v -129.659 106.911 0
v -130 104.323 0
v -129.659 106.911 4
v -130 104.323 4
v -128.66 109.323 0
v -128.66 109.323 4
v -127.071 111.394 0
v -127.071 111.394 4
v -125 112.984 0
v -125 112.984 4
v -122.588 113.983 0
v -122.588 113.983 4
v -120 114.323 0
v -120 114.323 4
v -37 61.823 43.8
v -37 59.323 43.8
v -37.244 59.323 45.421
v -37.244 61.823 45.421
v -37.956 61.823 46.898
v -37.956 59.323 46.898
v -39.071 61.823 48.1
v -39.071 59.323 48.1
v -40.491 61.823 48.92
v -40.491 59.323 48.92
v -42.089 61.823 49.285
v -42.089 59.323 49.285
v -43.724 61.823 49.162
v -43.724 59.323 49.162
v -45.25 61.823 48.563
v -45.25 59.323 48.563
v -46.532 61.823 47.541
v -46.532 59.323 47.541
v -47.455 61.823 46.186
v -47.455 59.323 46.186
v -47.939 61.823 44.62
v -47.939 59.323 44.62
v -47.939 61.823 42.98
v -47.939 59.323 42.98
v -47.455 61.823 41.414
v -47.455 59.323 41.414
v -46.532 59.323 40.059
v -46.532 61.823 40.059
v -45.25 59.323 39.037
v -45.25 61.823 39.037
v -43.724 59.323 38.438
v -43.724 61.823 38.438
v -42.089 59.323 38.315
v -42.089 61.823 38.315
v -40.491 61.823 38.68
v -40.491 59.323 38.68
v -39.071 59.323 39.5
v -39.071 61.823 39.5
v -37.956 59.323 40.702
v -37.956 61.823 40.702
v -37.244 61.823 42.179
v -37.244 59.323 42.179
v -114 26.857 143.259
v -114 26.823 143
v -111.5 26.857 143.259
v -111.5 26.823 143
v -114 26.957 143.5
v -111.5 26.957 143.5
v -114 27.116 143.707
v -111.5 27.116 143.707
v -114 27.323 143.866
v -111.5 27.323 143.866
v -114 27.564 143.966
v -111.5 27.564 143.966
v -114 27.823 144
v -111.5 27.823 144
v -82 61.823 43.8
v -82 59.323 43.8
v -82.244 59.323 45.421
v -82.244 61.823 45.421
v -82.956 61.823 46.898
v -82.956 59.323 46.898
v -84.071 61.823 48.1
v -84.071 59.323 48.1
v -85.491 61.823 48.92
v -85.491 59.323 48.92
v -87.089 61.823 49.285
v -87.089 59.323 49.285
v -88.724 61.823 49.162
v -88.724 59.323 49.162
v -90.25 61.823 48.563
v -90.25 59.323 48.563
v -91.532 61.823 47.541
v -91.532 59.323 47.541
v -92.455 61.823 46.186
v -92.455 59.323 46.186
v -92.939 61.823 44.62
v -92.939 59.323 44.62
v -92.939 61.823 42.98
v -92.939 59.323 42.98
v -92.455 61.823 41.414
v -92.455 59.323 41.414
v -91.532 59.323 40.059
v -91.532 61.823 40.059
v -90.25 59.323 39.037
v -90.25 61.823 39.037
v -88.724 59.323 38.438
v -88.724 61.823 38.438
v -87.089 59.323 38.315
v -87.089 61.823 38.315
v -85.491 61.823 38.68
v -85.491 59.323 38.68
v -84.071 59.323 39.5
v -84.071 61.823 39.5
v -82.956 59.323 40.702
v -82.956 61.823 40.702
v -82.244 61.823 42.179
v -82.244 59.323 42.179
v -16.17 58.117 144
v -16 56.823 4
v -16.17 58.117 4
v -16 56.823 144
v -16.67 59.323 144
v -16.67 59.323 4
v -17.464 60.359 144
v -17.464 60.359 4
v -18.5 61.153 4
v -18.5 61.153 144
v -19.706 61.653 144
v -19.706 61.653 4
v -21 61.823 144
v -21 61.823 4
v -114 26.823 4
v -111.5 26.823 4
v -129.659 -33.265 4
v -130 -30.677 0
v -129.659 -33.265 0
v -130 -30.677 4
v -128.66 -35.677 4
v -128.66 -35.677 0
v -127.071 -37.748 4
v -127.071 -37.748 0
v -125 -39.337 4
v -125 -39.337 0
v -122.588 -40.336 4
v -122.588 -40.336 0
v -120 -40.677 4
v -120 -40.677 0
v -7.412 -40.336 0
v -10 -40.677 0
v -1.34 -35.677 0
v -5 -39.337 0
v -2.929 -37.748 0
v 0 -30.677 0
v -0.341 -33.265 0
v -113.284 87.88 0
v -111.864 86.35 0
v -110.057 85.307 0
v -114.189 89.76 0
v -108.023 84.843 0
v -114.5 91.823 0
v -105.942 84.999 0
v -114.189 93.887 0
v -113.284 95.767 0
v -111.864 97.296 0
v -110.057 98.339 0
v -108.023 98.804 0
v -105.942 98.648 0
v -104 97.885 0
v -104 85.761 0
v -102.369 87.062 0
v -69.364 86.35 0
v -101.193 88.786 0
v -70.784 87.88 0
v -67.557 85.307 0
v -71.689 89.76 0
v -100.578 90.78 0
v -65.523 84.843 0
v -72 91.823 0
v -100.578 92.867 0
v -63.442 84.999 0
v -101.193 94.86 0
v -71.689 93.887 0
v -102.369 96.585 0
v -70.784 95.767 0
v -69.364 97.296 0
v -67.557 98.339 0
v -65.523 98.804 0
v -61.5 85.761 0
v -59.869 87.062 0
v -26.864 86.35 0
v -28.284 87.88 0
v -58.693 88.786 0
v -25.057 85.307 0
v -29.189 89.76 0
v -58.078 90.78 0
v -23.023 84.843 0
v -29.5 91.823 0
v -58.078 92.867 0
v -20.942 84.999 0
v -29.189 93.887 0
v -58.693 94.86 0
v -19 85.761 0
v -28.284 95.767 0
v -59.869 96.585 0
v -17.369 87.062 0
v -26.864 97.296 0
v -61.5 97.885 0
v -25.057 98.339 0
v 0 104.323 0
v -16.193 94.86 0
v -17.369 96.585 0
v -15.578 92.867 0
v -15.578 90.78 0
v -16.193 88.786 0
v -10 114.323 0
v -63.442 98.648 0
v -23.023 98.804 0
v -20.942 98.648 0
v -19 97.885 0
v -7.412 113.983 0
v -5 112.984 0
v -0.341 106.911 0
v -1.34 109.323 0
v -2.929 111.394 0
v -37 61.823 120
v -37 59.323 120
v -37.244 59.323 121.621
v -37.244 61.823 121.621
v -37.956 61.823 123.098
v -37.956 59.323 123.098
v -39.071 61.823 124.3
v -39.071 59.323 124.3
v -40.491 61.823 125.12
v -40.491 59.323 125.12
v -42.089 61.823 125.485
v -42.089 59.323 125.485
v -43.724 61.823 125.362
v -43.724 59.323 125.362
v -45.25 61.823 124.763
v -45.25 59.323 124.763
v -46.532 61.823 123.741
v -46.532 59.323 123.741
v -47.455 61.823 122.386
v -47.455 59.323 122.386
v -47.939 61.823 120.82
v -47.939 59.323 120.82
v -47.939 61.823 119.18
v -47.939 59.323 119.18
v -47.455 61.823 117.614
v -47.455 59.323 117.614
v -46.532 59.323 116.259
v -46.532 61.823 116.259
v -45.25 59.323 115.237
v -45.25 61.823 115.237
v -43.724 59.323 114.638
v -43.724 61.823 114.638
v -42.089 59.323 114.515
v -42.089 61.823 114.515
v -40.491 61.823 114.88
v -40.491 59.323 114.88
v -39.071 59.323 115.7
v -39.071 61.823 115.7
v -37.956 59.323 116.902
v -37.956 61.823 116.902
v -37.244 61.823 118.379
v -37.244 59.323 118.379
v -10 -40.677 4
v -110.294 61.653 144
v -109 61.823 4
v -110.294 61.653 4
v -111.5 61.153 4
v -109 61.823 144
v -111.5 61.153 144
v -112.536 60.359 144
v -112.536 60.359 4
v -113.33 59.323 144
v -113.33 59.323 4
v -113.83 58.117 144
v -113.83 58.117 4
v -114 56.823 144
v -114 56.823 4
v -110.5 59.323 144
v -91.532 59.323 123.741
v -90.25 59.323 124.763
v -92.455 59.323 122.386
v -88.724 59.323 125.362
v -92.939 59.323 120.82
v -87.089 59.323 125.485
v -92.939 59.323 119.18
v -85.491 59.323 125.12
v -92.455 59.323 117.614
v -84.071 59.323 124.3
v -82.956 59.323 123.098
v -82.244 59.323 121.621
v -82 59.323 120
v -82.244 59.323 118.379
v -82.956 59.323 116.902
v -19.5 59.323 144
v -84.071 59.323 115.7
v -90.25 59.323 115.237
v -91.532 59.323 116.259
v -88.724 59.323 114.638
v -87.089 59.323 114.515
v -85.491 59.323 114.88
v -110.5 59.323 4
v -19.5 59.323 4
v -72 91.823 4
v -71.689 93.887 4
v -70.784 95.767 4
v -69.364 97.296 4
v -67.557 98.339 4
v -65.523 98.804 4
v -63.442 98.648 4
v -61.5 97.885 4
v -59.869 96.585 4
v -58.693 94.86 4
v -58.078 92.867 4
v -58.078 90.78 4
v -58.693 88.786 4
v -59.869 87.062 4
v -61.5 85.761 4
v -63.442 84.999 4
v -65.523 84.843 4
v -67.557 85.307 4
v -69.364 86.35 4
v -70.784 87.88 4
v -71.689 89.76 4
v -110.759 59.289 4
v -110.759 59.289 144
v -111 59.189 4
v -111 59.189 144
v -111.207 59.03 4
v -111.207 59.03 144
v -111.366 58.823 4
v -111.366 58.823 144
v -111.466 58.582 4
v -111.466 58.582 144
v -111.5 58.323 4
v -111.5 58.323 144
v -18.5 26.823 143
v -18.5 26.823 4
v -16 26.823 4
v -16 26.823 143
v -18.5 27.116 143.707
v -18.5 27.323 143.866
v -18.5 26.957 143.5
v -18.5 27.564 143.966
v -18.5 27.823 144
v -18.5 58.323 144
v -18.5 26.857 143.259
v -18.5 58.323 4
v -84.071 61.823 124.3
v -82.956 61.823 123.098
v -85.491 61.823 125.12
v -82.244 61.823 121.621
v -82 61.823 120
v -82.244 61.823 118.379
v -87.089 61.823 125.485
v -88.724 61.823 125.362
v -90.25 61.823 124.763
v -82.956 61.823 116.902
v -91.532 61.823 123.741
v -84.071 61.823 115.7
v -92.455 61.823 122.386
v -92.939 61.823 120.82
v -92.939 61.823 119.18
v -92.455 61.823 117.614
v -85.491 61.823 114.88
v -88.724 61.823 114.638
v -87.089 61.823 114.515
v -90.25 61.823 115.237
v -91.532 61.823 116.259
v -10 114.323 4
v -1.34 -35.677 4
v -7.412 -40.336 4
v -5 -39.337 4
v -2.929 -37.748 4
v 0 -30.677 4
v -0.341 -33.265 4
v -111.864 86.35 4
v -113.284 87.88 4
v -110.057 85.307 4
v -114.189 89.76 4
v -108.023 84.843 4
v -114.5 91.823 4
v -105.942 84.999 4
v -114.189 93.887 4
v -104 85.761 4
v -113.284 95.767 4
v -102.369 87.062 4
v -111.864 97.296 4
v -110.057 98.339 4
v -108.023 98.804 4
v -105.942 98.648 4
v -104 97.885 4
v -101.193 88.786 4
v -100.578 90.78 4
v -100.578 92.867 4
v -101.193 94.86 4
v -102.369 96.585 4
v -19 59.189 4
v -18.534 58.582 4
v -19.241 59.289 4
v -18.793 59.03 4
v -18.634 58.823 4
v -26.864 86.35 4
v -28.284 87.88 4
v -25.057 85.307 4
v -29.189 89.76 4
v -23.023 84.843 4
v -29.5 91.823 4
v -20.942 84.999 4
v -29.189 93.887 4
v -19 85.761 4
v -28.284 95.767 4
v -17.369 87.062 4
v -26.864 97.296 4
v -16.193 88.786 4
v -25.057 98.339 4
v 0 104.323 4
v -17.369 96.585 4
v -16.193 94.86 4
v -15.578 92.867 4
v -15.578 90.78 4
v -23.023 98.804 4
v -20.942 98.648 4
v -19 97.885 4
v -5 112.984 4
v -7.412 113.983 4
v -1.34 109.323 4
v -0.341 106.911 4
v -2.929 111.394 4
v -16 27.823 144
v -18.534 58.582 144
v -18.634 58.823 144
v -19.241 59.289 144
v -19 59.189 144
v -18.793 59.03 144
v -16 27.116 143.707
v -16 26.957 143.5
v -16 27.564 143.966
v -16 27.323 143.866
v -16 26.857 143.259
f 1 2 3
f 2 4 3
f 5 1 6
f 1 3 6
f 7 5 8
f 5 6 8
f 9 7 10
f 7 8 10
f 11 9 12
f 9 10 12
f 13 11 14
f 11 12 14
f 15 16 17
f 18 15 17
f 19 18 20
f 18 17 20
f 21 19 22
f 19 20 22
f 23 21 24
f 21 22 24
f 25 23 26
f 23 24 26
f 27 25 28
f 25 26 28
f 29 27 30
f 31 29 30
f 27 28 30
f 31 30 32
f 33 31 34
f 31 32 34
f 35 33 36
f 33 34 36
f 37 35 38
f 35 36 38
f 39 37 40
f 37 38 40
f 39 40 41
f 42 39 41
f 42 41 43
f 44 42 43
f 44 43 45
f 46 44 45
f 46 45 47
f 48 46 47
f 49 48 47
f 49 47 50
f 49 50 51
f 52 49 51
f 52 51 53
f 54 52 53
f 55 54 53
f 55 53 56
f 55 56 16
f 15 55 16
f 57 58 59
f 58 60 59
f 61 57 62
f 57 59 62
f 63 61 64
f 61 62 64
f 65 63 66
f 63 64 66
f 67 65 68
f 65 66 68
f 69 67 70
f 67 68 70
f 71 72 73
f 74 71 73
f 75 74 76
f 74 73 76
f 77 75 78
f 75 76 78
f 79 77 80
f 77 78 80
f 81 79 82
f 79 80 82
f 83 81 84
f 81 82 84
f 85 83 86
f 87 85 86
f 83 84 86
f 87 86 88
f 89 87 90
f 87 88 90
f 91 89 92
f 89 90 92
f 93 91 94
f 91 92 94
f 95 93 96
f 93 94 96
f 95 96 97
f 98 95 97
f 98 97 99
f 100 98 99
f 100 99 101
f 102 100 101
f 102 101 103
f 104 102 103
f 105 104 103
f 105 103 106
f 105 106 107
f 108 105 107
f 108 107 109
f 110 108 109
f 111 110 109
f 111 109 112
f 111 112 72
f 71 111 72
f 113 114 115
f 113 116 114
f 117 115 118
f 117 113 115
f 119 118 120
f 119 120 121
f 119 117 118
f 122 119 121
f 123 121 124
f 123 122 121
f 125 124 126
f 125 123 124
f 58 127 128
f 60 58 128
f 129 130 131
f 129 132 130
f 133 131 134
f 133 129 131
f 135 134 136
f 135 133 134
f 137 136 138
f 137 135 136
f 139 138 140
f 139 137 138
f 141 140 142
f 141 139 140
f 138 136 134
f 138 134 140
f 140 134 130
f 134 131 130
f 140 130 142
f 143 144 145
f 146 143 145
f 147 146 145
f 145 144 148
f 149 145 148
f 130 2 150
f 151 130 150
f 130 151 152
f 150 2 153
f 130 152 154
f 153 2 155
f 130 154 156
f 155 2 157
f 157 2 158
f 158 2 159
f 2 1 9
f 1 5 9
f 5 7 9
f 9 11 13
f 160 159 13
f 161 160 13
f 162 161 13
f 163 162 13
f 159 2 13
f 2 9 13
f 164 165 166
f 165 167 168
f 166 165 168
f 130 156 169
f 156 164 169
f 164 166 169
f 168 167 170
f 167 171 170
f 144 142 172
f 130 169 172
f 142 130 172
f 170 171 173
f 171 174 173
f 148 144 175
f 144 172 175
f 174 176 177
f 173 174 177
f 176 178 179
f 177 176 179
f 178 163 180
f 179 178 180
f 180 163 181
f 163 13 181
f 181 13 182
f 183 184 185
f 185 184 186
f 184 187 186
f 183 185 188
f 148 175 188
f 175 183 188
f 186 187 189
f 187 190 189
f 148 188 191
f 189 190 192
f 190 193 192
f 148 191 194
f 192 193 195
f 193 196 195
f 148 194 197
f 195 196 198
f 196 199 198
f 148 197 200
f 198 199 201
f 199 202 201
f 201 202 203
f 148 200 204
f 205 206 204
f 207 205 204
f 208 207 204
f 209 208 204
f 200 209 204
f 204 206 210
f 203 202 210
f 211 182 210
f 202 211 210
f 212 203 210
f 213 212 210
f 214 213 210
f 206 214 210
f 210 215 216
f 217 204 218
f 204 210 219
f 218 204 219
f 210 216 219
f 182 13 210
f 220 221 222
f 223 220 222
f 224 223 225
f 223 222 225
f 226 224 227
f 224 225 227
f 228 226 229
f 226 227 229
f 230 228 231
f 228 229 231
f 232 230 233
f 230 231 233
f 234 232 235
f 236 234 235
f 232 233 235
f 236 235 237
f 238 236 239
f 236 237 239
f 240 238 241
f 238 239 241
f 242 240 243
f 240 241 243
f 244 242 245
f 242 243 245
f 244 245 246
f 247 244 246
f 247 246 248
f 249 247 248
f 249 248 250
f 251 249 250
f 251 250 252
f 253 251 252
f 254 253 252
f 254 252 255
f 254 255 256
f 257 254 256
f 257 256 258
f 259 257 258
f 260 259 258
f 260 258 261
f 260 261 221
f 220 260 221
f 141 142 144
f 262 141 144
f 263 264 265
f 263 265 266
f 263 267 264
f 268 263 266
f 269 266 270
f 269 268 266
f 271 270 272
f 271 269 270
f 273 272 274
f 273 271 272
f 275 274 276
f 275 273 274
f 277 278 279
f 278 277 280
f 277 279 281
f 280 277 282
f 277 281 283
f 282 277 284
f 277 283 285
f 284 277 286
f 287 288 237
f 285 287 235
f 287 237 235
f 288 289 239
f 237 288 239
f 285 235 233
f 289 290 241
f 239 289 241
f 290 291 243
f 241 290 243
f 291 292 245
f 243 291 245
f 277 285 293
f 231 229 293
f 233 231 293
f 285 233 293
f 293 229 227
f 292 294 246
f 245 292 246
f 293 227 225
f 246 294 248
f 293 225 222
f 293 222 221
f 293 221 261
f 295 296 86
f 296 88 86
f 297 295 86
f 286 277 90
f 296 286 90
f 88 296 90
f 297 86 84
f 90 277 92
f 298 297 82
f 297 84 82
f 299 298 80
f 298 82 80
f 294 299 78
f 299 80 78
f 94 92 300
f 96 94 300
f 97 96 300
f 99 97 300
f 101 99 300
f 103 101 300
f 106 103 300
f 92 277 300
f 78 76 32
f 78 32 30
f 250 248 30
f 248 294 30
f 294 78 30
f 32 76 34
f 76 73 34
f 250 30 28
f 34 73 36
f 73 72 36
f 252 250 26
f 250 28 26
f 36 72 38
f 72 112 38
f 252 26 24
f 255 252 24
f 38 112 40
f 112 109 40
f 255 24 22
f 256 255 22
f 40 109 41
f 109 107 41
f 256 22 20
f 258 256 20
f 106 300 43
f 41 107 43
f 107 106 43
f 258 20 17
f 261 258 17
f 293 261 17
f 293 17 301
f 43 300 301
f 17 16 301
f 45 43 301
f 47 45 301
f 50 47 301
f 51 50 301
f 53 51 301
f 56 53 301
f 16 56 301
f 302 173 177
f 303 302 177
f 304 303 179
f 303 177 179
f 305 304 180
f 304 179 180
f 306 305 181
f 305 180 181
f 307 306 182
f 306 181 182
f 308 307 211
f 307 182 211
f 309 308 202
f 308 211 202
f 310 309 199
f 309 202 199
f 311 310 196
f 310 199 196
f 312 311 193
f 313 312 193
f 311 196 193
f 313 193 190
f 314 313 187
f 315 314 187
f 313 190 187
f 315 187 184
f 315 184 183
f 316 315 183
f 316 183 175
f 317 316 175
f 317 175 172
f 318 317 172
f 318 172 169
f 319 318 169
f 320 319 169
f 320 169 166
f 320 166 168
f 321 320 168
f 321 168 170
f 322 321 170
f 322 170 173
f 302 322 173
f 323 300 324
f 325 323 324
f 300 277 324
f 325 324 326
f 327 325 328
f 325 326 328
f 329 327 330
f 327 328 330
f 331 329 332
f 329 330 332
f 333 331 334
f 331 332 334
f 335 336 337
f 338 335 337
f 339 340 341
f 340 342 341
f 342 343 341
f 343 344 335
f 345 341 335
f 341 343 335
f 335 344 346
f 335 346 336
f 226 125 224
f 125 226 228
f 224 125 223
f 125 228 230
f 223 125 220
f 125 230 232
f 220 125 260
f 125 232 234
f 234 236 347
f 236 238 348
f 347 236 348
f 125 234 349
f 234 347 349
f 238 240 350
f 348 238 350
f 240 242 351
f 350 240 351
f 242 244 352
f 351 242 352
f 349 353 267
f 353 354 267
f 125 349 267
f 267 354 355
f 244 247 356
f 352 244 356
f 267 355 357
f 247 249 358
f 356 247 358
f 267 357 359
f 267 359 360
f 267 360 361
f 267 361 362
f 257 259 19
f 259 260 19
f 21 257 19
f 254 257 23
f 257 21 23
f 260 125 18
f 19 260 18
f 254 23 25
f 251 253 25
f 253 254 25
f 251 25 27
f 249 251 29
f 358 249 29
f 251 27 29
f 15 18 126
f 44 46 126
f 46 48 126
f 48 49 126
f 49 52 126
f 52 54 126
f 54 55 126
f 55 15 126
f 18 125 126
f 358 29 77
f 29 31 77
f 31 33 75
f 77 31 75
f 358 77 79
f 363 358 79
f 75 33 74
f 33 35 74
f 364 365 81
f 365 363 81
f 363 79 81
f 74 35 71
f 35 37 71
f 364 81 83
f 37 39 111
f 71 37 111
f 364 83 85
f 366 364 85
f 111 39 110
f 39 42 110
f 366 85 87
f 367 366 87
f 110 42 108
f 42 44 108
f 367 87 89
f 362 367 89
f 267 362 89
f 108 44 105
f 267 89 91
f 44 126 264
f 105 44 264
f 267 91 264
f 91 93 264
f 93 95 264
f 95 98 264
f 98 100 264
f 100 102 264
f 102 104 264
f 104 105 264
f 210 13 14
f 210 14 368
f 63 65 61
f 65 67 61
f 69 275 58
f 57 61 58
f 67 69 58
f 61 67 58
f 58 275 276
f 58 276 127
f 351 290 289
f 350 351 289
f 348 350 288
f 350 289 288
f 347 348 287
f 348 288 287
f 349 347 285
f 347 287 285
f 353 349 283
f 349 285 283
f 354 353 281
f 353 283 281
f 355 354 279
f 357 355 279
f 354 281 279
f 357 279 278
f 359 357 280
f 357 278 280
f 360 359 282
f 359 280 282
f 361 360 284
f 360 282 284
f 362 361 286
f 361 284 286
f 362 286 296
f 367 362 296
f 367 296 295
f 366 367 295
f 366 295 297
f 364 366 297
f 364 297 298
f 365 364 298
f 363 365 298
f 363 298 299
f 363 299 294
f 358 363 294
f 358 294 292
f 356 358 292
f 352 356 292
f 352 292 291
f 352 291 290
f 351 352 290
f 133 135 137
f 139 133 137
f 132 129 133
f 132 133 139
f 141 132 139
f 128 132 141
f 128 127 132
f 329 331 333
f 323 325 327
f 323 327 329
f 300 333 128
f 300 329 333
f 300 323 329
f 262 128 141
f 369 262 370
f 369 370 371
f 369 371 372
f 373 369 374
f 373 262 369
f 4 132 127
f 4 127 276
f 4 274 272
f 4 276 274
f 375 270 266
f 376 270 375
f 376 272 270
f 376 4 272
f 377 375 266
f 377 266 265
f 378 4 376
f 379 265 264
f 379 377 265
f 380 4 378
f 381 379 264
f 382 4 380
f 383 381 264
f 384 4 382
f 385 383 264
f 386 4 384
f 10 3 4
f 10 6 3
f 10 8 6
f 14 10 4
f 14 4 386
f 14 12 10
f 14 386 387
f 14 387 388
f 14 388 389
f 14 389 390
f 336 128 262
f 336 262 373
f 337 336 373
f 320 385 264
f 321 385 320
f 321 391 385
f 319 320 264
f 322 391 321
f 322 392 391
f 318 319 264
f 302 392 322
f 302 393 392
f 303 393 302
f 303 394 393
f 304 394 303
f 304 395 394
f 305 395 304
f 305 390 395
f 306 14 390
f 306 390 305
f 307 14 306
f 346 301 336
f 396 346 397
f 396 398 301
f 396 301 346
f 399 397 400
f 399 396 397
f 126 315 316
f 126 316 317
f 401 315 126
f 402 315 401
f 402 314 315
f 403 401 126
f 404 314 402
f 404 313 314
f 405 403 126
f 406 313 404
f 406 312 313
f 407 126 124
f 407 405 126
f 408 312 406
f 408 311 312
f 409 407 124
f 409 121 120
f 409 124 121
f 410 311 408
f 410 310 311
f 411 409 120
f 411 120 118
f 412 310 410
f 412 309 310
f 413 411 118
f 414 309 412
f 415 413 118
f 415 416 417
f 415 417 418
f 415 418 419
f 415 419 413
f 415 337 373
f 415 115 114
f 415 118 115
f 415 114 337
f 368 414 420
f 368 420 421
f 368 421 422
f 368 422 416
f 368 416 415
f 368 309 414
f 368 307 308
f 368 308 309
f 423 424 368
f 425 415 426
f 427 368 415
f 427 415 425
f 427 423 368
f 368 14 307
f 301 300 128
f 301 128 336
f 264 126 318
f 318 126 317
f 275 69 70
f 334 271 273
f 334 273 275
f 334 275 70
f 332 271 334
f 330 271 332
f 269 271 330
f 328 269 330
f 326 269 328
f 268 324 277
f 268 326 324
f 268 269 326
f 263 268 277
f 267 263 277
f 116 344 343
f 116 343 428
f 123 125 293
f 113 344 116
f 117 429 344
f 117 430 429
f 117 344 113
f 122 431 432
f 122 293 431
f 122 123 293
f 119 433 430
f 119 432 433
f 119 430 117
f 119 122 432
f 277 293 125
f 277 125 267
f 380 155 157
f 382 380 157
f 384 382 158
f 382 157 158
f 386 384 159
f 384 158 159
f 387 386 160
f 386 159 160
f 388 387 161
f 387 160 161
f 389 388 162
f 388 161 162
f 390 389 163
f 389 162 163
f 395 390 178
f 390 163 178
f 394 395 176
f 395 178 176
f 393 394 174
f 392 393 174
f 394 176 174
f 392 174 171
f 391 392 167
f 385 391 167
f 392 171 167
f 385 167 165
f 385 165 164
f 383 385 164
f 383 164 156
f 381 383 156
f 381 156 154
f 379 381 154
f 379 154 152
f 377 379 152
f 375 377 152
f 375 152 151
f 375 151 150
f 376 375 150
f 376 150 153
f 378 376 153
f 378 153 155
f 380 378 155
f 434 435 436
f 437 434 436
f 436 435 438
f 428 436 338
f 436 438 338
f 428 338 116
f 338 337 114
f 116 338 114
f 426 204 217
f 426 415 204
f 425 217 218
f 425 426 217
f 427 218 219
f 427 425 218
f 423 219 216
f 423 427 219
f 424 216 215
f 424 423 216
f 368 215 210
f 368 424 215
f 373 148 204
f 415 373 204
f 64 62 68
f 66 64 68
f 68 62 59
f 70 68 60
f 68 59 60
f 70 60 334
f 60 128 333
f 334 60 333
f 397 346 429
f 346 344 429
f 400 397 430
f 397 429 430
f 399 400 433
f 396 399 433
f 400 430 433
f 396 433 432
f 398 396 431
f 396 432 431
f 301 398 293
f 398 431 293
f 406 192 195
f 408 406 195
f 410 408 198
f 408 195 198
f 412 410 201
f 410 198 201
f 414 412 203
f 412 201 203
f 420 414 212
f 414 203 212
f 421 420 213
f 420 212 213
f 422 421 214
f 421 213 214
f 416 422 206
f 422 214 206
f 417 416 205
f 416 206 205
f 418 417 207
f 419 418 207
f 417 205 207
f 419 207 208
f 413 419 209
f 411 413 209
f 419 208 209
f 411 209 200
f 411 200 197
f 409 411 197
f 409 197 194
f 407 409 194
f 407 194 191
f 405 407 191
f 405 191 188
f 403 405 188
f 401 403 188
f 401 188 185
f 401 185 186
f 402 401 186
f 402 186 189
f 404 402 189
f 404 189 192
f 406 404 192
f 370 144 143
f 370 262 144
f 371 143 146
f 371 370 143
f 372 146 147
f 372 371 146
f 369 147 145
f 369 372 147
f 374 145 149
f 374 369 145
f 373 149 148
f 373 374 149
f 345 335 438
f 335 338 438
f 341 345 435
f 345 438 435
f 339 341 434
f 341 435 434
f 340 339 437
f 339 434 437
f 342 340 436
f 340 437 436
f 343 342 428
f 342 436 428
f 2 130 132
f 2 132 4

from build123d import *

# Parameters (mm, degrees)
F0_W     = 130
F0_H     = 155
F1_DEPTH = 4
F2_R     = 10
F4_DEPTH = 140
F5_R     = 5
F6_R     = 1
F7_R     = 1
F9_D     = 14
F11_D    = 11


# Not quite as in the source:
# - a feature names something its author has since deleted; it is built from what else it names


with BuildPart() as f1:
    # F0 (on Top) → F1 (new body)
    with BuildSketch(Plane.XY):
        with Locations((-65, 36.8233056366)):
            Rectangle(F0_W, F0_H)
    extrude(amount=F1_DEPTH)

    # F2
    f2_edges = [f1.edges().sort_by_distance(p)[0] for p in [
        (0, -40.676694, 2),
        (0, 114.323306, 2),
        (-130, 114.323306, 2),
        (-130, -40.676694, 2),
    ]]
    fillet(f2_edges, radius=F2_R)

    # F3 (on face) → F4 (join)
    with BuildSketch(Plane.XY.offset(4)):
        Polygon((-16, 26.8233056366), (-16, 61.8233056366), (-114, 61.8233056366), (-114, 26.8233056366), (-111.5, 26.8233056366), (-111.5, 59.3233056366), (-18.5, 59.3233056366), (-18.5, 26.8233056366), align=None)
    extrude(amount=F4_DEPTH)

    # F5
    f5_edges = [f1.edges().sort_by_distance(p)[0] for p in [
        (-114, 61.823306, 74),
        (-16, 61.823306, 74),
    ]]
    fillet(f5_edges, radius=F5_R)

    # F6
    f6_edges = [f1.edges().sort_by_distance(p)[0] for p in [
        (-18.5, 59.323306, 74),
        (-111.5, 59.323306, 74),
    ]]
    fillet(f6_edges, radius=F6_R)

    # F7
    f7_edges = [f1.edges().sort_by_distance(p)[0] for p in [
        (-112.75, 26.823306, 144),
        (-17.25, 26.823306, 144),
    ]]
    fillet(f7_edges, radius=F7_R)

    # F9 (through all)
    with Locations(Plane.XY.offset(4)):
        with Locations((-22.5, 91.8233056366), (-65, 91.8233056366), (-107.5, 91.8233056366)):
            Hole(F9_D / 2)

    # F11 (through all)
    with Locations(Plane(origin=(0, 61.8233056366, 0), x_dir=(-1, 0, 0), z_dir=(0, 1, 0))):
        with Locations((42.5, 43.8), (87.5, 43.8), (42.5, 120), (87.5, 120)):
            Hole(F11_D / 2)


solid = f1.part
